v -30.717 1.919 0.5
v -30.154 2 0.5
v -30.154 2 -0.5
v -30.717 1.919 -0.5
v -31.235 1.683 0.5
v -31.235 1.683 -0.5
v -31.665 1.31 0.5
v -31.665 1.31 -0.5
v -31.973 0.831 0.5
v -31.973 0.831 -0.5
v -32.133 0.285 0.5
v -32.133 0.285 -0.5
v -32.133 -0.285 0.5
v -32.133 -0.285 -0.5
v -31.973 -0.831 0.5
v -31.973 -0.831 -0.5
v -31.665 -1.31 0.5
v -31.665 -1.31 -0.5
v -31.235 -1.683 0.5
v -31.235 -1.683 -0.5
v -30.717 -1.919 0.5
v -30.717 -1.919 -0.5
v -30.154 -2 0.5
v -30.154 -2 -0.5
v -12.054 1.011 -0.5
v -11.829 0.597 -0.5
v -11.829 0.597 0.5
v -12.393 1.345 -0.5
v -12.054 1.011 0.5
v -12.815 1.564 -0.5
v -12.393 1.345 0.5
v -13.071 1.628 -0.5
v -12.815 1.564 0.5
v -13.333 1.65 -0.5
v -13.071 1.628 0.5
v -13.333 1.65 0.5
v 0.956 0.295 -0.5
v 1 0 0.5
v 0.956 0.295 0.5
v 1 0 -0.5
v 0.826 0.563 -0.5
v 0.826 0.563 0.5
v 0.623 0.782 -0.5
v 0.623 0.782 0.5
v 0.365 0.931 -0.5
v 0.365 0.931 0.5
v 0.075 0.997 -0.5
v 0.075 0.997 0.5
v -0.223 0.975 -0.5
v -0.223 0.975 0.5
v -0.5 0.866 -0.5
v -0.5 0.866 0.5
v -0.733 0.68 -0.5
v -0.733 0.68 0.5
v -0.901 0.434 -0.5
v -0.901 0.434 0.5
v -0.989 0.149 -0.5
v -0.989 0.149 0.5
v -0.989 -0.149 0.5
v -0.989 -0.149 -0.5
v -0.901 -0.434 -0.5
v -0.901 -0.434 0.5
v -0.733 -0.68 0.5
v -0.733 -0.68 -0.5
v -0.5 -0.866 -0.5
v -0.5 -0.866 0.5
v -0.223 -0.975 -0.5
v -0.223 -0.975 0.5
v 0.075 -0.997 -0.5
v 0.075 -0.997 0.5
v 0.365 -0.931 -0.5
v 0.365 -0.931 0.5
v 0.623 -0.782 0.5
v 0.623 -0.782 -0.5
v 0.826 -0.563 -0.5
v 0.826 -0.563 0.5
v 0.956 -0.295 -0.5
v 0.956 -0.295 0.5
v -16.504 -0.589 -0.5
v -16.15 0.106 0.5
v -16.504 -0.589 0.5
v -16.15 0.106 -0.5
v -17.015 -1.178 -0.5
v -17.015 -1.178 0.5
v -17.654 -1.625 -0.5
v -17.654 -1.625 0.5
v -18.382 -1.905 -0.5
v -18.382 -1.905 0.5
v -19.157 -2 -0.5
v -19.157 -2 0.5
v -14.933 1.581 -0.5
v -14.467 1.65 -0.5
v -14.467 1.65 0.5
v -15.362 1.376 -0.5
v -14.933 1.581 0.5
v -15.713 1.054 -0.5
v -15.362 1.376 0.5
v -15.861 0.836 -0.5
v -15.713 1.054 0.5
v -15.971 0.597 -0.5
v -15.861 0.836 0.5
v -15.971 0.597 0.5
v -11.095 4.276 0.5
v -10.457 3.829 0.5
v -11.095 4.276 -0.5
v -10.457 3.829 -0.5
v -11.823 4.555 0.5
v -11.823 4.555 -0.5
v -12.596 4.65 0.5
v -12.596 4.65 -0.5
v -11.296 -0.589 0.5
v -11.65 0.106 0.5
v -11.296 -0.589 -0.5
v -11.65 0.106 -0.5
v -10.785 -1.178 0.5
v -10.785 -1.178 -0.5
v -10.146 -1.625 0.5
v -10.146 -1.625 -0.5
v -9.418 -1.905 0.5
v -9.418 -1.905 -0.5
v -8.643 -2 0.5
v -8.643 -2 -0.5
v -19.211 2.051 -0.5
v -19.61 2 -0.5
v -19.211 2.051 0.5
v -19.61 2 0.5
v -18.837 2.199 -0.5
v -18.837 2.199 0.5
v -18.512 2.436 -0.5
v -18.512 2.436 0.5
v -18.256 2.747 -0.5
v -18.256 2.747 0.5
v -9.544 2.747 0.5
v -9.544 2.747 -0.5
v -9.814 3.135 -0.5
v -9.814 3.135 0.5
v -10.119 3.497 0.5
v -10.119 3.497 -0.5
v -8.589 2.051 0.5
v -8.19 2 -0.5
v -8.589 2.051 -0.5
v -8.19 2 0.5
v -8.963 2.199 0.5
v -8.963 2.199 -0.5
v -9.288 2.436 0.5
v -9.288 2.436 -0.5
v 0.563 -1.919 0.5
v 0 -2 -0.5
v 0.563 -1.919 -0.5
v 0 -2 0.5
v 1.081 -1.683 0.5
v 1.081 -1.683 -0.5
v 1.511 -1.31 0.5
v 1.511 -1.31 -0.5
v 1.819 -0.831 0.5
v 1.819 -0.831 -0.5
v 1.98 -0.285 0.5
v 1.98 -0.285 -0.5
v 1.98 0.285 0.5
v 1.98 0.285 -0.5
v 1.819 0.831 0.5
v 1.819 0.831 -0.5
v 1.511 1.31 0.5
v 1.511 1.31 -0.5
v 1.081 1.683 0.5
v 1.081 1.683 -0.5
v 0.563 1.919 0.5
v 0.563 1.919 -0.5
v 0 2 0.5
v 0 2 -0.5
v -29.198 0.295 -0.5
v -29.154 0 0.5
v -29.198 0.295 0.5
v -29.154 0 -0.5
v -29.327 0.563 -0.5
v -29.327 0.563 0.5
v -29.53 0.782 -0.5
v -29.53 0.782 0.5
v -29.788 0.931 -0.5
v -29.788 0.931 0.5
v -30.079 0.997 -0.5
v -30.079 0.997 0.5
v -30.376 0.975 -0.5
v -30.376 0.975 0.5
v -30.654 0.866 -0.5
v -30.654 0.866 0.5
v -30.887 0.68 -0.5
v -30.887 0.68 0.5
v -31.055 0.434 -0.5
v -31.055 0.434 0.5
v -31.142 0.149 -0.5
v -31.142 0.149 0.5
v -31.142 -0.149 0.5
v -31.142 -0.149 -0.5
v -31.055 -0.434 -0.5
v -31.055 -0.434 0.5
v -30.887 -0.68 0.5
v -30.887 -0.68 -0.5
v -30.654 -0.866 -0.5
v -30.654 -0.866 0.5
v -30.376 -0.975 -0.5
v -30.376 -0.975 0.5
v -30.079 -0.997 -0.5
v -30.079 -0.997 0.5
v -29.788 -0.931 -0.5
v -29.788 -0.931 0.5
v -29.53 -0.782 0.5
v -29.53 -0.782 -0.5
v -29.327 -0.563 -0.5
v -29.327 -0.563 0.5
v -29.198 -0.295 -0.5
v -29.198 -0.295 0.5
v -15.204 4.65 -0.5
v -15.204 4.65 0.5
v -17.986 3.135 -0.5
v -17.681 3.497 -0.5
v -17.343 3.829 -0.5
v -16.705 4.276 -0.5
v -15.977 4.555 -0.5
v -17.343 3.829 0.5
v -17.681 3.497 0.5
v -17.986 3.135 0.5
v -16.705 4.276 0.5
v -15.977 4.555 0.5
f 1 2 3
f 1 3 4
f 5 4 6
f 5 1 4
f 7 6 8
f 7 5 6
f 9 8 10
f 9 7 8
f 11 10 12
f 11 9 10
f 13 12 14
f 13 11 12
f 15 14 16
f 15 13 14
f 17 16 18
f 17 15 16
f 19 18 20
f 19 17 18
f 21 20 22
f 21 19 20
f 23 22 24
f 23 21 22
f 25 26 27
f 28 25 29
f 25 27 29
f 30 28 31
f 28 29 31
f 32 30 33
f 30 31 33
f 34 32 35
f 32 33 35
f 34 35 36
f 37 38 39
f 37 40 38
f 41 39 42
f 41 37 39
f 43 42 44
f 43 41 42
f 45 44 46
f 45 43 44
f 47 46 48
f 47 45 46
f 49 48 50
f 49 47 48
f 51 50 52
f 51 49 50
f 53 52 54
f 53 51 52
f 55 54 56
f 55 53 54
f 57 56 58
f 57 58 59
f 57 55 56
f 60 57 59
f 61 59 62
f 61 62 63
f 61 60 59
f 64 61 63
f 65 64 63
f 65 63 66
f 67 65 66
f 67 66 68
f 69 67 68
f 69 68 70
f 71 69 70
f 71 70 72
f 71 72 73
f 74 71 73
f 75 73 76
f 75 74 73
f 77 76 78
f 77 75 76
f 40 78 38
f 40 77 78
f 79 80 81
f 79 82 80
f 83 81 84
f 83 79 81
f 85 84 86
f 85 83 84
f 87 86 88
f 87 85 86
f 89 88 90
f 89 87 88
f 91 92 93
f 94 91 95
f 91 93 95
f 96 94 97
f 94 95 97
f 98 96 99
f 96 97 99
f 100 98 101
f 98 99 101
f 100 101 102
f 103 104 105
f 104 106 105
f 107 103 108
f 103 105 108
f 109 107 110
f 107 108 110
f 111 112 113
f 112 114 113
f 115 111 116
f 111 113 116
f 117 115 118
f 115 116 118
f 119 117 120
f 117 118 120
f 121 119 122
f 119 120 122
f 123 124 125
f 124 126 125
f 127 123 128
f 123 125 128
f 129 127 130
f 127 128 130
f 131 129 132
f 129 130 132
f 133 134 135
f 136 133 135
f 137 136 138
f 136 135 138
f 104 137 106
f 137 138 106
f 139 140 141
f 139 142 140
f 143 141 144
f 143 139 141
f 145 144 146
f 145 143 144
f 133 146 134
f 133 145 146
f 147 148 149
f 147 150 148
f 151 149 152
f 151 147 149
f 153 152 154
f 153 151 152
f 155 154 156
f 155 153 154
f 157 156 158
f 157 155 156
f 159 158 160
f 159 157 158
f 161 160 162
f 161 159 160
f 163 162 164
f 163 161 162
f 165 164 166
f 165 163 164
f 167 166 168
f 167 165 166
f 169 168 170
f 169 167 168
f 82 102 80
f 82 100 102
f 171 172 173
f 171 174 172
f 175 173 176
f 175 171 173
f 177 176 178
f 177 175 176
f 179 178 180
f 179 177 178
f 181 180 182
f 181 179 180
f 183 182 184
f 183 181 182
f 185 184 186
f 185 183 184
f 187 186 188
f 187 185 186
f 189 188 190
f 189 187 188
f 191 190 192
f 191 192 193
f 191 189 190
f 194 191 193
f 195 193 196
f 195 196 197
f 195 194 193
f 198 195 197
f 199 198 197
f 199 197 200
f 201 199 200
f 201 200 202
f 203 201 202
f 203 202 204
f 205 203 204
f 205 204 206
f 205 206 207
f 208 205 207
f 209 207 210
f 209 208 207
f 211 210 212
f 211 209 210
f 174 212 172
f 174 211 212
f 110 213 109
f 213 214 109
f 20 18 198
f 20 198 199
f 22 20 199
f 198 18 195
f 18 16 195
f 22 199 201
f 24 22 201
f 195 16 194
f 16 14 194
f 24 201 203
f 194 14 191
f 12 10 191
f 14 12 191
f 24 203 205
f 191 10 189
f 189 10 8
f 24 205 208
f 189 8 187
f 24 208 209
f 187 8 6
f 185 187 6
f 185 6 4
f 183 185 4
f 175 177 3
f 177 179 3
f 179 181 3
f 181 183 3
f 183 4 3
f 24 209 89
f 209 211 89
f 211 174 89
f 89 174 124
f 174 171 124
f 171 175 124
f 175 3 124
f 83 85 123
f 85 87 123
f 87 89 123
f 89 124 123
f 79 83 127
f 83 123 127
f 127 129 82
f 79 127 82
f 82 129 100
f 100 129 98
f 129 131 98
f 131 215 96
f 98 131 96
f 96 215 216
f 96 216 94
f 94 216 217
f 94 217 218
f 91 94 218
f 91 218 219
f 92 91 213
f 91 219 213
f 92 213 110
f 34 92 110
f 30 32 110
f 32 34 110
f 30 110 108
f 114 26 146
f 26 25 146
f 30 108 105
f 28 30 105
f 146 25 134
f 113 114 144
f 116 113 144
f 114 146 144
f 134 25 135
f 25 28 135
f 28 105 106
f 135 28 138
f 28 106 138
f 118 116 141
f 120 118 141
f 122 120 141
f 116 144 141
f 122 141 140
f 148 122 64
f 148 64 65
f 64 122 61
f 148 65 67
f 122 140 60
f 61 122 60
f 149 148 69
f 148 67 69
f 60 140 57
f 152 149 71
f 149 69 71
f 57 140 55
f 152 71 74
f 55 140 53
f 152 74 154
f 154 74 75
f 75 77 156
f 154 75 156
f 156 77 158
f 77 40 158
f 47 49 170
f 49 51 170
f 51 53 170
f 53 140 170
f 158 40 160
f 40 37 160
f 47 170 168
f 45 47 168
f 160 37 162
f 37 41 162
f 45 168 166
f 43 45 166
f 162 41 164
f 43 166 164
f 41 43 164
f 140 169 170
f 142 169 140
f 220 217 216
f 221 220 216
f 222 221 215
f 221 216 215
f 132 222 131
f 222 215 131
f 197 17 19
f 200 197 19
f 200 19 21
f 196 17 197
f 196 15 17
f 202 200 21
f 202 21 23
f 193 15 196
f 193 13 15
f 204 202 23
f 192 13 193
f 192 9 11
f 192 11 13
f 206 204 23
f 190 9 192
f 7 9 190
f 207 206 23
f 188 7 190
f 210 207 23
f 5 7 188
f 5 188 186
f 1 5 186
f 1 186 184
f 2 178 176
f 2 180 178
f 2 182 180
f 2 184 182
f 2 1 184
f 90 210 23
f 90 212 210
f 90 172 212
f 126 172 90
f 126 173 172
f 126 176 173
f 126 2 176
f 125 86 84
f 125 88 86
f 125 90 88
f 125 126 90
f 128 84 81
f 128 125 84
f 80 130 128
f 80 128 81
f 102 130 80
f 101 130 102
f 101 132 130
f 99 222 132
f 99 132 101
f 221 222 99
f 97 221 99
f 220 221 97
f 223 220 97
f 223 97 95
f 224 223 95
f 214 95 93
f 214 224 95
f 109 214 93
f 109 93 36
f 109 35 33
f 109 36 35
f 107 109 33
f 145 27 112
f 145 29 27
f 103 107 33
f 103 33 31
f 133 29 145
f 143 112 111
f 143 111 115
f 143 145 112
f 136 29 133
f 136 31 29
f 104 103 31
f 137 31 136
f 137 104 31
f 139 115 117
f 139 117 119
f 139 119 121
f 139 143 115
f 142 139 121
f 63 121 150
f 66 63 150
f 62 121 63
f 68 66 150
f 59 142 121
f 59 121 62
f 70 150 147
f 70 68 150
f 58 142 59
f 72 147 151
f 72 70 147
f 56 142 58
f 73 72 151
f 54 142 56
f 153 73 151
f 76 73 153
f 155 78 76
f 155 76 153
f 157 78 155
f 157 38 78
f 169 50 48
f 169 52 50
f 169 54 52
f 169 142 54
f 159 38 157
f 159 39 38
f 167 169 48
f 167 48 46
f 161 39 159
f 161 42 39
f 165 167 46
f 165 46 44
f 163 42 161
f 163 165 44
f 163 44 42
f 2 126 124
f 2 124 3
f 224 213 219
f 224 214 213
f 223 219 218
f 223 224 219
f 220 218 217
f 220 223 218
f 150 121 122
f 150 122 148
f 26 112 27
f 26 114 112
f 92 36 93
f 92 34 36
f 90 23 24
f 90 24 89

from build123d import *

# Parameters (mm, degrees)
SKETCH_1_R      = 1
EXTRUDE_1_DEPTH = 0.5
EXTRUDE1_DEPTH  = 0.5
EXTRUDE2_DEPTH  = 0.5
FILLET1_R       = 1.6
FILLET2_R       = 3.2


with BuildPart() as part:
    # Эскиз1 → Бобышка-Вытянуть1 (new, symmetric)
    with BuildSketch(Plane.XY):
        with BuildLine():
            Line((0, 2), (-30.1536, 2))
            ThreePointArc((-30.1536, 2), (-32.1536, 0), (-30.1536, -2))
            Line((-30.1536, -2), (0, -2))
            ThreePointArc((0, -2), (2, 0), (0, 2))
        make_face()
        with Locations((-30.1536, 0)):
            Circle(SKETCH_1_R, mode=Mode.SUBTRACT)
        Circle(SKETCH_1_R, mode=Mode.SUBTRACT)
    extrude(amount=EXTRUDE_1_DEPTH, both=True)

    # Sketch2 → Extrude1 (add, symmetric)
    with BuildSketch(Plane.XY):
        with BuildLine():
            Line((-11.879660865, 0.735343308), (-10.884077321, -2))
            Line((-10.884077321, -2), (-9.154212394, -2))
            ThreePointArc((-9.154212394, -2), (-13.9, 5.15), (-18.645787606, -2))
            Line((-18.645787606, -2), (-16.915922679, -2))
            Line((-16.915922679, -2), (-15.920339135, 0.735343308))
            ThreePointArc((-15.920339135, 0.735343308), (-15.659833636, 1.235105491), (-15.278404875, 1.65))
            Line((-15.278404875, 1.65), (-12.521595125, 1.65))
            ThreePointArc((-12.521595125, 1.65), (-12.140166364, 1.235105491), (-11.879660865, 0.735343308))
        make_face()
    extrude(amount=EXTRUDE1_DEPTH, both=True)

    # Sketch → Extrude2 (cut, symmetric)
    with BuildSketch(Plane.XY):
        with BuildLine():
            Line((-10.884077321, -2), (-11.879660865, 0.735343308))
            ThreePointArc((-11.879660865, 0.735343308), (-12.140166364, 1.235105491), (-12.521595125, 1.65))
            Line((-12.521595125, 1.65), (-15.278404875, 1.65))
            ThreePointArc((-15.278404875, 1.65), (-15.659833636, 1.235105491), (-15.920339135, 0.735343308))
            Line((-15.920339135, 0.735343308), (-16.915922679, -2))
            Line((-16.915922679, -2), (-10.884077321, -2))
        make_face()
        with BuildLine():
            ThreePointArc((-11.686405638, 4.65), (-13.9, 5.15), (-16.113594362, 4.65))
            Line((-16.113594362, 4.65), (-11.686405638, 4.65))
        make_face()
    extrude(amount=EXTRUDE2_DEPTH, both=True, mode=Mode.SUBTRACT)

    # Fillet1
    fillet1_edges = [part.edges().sort_by_distance(p)[0] for p in [
        (-9.154212394, 2, 0),
        (-18.645787606, 2, 0),
        (-12.521595125, 1.65, 0),
        (-15.278404875, 1.65, 0),
    ]]
    fillet(fillet1_edges, radius=FILLET1_R)

    # Fillet2
    fillet2_edges = [part.edges().sort_by_distance(p)[0] for p in [
        (-10.884077321, -2, 0),
        (-16.915922679, -2, 0),
        (-11.686405638, 4.65, 0),
        (-16.113594362, 4.65, 0),
    ]]
    fillet(fillet2_edges, radius=FILLET2_R)


solid = part.part
